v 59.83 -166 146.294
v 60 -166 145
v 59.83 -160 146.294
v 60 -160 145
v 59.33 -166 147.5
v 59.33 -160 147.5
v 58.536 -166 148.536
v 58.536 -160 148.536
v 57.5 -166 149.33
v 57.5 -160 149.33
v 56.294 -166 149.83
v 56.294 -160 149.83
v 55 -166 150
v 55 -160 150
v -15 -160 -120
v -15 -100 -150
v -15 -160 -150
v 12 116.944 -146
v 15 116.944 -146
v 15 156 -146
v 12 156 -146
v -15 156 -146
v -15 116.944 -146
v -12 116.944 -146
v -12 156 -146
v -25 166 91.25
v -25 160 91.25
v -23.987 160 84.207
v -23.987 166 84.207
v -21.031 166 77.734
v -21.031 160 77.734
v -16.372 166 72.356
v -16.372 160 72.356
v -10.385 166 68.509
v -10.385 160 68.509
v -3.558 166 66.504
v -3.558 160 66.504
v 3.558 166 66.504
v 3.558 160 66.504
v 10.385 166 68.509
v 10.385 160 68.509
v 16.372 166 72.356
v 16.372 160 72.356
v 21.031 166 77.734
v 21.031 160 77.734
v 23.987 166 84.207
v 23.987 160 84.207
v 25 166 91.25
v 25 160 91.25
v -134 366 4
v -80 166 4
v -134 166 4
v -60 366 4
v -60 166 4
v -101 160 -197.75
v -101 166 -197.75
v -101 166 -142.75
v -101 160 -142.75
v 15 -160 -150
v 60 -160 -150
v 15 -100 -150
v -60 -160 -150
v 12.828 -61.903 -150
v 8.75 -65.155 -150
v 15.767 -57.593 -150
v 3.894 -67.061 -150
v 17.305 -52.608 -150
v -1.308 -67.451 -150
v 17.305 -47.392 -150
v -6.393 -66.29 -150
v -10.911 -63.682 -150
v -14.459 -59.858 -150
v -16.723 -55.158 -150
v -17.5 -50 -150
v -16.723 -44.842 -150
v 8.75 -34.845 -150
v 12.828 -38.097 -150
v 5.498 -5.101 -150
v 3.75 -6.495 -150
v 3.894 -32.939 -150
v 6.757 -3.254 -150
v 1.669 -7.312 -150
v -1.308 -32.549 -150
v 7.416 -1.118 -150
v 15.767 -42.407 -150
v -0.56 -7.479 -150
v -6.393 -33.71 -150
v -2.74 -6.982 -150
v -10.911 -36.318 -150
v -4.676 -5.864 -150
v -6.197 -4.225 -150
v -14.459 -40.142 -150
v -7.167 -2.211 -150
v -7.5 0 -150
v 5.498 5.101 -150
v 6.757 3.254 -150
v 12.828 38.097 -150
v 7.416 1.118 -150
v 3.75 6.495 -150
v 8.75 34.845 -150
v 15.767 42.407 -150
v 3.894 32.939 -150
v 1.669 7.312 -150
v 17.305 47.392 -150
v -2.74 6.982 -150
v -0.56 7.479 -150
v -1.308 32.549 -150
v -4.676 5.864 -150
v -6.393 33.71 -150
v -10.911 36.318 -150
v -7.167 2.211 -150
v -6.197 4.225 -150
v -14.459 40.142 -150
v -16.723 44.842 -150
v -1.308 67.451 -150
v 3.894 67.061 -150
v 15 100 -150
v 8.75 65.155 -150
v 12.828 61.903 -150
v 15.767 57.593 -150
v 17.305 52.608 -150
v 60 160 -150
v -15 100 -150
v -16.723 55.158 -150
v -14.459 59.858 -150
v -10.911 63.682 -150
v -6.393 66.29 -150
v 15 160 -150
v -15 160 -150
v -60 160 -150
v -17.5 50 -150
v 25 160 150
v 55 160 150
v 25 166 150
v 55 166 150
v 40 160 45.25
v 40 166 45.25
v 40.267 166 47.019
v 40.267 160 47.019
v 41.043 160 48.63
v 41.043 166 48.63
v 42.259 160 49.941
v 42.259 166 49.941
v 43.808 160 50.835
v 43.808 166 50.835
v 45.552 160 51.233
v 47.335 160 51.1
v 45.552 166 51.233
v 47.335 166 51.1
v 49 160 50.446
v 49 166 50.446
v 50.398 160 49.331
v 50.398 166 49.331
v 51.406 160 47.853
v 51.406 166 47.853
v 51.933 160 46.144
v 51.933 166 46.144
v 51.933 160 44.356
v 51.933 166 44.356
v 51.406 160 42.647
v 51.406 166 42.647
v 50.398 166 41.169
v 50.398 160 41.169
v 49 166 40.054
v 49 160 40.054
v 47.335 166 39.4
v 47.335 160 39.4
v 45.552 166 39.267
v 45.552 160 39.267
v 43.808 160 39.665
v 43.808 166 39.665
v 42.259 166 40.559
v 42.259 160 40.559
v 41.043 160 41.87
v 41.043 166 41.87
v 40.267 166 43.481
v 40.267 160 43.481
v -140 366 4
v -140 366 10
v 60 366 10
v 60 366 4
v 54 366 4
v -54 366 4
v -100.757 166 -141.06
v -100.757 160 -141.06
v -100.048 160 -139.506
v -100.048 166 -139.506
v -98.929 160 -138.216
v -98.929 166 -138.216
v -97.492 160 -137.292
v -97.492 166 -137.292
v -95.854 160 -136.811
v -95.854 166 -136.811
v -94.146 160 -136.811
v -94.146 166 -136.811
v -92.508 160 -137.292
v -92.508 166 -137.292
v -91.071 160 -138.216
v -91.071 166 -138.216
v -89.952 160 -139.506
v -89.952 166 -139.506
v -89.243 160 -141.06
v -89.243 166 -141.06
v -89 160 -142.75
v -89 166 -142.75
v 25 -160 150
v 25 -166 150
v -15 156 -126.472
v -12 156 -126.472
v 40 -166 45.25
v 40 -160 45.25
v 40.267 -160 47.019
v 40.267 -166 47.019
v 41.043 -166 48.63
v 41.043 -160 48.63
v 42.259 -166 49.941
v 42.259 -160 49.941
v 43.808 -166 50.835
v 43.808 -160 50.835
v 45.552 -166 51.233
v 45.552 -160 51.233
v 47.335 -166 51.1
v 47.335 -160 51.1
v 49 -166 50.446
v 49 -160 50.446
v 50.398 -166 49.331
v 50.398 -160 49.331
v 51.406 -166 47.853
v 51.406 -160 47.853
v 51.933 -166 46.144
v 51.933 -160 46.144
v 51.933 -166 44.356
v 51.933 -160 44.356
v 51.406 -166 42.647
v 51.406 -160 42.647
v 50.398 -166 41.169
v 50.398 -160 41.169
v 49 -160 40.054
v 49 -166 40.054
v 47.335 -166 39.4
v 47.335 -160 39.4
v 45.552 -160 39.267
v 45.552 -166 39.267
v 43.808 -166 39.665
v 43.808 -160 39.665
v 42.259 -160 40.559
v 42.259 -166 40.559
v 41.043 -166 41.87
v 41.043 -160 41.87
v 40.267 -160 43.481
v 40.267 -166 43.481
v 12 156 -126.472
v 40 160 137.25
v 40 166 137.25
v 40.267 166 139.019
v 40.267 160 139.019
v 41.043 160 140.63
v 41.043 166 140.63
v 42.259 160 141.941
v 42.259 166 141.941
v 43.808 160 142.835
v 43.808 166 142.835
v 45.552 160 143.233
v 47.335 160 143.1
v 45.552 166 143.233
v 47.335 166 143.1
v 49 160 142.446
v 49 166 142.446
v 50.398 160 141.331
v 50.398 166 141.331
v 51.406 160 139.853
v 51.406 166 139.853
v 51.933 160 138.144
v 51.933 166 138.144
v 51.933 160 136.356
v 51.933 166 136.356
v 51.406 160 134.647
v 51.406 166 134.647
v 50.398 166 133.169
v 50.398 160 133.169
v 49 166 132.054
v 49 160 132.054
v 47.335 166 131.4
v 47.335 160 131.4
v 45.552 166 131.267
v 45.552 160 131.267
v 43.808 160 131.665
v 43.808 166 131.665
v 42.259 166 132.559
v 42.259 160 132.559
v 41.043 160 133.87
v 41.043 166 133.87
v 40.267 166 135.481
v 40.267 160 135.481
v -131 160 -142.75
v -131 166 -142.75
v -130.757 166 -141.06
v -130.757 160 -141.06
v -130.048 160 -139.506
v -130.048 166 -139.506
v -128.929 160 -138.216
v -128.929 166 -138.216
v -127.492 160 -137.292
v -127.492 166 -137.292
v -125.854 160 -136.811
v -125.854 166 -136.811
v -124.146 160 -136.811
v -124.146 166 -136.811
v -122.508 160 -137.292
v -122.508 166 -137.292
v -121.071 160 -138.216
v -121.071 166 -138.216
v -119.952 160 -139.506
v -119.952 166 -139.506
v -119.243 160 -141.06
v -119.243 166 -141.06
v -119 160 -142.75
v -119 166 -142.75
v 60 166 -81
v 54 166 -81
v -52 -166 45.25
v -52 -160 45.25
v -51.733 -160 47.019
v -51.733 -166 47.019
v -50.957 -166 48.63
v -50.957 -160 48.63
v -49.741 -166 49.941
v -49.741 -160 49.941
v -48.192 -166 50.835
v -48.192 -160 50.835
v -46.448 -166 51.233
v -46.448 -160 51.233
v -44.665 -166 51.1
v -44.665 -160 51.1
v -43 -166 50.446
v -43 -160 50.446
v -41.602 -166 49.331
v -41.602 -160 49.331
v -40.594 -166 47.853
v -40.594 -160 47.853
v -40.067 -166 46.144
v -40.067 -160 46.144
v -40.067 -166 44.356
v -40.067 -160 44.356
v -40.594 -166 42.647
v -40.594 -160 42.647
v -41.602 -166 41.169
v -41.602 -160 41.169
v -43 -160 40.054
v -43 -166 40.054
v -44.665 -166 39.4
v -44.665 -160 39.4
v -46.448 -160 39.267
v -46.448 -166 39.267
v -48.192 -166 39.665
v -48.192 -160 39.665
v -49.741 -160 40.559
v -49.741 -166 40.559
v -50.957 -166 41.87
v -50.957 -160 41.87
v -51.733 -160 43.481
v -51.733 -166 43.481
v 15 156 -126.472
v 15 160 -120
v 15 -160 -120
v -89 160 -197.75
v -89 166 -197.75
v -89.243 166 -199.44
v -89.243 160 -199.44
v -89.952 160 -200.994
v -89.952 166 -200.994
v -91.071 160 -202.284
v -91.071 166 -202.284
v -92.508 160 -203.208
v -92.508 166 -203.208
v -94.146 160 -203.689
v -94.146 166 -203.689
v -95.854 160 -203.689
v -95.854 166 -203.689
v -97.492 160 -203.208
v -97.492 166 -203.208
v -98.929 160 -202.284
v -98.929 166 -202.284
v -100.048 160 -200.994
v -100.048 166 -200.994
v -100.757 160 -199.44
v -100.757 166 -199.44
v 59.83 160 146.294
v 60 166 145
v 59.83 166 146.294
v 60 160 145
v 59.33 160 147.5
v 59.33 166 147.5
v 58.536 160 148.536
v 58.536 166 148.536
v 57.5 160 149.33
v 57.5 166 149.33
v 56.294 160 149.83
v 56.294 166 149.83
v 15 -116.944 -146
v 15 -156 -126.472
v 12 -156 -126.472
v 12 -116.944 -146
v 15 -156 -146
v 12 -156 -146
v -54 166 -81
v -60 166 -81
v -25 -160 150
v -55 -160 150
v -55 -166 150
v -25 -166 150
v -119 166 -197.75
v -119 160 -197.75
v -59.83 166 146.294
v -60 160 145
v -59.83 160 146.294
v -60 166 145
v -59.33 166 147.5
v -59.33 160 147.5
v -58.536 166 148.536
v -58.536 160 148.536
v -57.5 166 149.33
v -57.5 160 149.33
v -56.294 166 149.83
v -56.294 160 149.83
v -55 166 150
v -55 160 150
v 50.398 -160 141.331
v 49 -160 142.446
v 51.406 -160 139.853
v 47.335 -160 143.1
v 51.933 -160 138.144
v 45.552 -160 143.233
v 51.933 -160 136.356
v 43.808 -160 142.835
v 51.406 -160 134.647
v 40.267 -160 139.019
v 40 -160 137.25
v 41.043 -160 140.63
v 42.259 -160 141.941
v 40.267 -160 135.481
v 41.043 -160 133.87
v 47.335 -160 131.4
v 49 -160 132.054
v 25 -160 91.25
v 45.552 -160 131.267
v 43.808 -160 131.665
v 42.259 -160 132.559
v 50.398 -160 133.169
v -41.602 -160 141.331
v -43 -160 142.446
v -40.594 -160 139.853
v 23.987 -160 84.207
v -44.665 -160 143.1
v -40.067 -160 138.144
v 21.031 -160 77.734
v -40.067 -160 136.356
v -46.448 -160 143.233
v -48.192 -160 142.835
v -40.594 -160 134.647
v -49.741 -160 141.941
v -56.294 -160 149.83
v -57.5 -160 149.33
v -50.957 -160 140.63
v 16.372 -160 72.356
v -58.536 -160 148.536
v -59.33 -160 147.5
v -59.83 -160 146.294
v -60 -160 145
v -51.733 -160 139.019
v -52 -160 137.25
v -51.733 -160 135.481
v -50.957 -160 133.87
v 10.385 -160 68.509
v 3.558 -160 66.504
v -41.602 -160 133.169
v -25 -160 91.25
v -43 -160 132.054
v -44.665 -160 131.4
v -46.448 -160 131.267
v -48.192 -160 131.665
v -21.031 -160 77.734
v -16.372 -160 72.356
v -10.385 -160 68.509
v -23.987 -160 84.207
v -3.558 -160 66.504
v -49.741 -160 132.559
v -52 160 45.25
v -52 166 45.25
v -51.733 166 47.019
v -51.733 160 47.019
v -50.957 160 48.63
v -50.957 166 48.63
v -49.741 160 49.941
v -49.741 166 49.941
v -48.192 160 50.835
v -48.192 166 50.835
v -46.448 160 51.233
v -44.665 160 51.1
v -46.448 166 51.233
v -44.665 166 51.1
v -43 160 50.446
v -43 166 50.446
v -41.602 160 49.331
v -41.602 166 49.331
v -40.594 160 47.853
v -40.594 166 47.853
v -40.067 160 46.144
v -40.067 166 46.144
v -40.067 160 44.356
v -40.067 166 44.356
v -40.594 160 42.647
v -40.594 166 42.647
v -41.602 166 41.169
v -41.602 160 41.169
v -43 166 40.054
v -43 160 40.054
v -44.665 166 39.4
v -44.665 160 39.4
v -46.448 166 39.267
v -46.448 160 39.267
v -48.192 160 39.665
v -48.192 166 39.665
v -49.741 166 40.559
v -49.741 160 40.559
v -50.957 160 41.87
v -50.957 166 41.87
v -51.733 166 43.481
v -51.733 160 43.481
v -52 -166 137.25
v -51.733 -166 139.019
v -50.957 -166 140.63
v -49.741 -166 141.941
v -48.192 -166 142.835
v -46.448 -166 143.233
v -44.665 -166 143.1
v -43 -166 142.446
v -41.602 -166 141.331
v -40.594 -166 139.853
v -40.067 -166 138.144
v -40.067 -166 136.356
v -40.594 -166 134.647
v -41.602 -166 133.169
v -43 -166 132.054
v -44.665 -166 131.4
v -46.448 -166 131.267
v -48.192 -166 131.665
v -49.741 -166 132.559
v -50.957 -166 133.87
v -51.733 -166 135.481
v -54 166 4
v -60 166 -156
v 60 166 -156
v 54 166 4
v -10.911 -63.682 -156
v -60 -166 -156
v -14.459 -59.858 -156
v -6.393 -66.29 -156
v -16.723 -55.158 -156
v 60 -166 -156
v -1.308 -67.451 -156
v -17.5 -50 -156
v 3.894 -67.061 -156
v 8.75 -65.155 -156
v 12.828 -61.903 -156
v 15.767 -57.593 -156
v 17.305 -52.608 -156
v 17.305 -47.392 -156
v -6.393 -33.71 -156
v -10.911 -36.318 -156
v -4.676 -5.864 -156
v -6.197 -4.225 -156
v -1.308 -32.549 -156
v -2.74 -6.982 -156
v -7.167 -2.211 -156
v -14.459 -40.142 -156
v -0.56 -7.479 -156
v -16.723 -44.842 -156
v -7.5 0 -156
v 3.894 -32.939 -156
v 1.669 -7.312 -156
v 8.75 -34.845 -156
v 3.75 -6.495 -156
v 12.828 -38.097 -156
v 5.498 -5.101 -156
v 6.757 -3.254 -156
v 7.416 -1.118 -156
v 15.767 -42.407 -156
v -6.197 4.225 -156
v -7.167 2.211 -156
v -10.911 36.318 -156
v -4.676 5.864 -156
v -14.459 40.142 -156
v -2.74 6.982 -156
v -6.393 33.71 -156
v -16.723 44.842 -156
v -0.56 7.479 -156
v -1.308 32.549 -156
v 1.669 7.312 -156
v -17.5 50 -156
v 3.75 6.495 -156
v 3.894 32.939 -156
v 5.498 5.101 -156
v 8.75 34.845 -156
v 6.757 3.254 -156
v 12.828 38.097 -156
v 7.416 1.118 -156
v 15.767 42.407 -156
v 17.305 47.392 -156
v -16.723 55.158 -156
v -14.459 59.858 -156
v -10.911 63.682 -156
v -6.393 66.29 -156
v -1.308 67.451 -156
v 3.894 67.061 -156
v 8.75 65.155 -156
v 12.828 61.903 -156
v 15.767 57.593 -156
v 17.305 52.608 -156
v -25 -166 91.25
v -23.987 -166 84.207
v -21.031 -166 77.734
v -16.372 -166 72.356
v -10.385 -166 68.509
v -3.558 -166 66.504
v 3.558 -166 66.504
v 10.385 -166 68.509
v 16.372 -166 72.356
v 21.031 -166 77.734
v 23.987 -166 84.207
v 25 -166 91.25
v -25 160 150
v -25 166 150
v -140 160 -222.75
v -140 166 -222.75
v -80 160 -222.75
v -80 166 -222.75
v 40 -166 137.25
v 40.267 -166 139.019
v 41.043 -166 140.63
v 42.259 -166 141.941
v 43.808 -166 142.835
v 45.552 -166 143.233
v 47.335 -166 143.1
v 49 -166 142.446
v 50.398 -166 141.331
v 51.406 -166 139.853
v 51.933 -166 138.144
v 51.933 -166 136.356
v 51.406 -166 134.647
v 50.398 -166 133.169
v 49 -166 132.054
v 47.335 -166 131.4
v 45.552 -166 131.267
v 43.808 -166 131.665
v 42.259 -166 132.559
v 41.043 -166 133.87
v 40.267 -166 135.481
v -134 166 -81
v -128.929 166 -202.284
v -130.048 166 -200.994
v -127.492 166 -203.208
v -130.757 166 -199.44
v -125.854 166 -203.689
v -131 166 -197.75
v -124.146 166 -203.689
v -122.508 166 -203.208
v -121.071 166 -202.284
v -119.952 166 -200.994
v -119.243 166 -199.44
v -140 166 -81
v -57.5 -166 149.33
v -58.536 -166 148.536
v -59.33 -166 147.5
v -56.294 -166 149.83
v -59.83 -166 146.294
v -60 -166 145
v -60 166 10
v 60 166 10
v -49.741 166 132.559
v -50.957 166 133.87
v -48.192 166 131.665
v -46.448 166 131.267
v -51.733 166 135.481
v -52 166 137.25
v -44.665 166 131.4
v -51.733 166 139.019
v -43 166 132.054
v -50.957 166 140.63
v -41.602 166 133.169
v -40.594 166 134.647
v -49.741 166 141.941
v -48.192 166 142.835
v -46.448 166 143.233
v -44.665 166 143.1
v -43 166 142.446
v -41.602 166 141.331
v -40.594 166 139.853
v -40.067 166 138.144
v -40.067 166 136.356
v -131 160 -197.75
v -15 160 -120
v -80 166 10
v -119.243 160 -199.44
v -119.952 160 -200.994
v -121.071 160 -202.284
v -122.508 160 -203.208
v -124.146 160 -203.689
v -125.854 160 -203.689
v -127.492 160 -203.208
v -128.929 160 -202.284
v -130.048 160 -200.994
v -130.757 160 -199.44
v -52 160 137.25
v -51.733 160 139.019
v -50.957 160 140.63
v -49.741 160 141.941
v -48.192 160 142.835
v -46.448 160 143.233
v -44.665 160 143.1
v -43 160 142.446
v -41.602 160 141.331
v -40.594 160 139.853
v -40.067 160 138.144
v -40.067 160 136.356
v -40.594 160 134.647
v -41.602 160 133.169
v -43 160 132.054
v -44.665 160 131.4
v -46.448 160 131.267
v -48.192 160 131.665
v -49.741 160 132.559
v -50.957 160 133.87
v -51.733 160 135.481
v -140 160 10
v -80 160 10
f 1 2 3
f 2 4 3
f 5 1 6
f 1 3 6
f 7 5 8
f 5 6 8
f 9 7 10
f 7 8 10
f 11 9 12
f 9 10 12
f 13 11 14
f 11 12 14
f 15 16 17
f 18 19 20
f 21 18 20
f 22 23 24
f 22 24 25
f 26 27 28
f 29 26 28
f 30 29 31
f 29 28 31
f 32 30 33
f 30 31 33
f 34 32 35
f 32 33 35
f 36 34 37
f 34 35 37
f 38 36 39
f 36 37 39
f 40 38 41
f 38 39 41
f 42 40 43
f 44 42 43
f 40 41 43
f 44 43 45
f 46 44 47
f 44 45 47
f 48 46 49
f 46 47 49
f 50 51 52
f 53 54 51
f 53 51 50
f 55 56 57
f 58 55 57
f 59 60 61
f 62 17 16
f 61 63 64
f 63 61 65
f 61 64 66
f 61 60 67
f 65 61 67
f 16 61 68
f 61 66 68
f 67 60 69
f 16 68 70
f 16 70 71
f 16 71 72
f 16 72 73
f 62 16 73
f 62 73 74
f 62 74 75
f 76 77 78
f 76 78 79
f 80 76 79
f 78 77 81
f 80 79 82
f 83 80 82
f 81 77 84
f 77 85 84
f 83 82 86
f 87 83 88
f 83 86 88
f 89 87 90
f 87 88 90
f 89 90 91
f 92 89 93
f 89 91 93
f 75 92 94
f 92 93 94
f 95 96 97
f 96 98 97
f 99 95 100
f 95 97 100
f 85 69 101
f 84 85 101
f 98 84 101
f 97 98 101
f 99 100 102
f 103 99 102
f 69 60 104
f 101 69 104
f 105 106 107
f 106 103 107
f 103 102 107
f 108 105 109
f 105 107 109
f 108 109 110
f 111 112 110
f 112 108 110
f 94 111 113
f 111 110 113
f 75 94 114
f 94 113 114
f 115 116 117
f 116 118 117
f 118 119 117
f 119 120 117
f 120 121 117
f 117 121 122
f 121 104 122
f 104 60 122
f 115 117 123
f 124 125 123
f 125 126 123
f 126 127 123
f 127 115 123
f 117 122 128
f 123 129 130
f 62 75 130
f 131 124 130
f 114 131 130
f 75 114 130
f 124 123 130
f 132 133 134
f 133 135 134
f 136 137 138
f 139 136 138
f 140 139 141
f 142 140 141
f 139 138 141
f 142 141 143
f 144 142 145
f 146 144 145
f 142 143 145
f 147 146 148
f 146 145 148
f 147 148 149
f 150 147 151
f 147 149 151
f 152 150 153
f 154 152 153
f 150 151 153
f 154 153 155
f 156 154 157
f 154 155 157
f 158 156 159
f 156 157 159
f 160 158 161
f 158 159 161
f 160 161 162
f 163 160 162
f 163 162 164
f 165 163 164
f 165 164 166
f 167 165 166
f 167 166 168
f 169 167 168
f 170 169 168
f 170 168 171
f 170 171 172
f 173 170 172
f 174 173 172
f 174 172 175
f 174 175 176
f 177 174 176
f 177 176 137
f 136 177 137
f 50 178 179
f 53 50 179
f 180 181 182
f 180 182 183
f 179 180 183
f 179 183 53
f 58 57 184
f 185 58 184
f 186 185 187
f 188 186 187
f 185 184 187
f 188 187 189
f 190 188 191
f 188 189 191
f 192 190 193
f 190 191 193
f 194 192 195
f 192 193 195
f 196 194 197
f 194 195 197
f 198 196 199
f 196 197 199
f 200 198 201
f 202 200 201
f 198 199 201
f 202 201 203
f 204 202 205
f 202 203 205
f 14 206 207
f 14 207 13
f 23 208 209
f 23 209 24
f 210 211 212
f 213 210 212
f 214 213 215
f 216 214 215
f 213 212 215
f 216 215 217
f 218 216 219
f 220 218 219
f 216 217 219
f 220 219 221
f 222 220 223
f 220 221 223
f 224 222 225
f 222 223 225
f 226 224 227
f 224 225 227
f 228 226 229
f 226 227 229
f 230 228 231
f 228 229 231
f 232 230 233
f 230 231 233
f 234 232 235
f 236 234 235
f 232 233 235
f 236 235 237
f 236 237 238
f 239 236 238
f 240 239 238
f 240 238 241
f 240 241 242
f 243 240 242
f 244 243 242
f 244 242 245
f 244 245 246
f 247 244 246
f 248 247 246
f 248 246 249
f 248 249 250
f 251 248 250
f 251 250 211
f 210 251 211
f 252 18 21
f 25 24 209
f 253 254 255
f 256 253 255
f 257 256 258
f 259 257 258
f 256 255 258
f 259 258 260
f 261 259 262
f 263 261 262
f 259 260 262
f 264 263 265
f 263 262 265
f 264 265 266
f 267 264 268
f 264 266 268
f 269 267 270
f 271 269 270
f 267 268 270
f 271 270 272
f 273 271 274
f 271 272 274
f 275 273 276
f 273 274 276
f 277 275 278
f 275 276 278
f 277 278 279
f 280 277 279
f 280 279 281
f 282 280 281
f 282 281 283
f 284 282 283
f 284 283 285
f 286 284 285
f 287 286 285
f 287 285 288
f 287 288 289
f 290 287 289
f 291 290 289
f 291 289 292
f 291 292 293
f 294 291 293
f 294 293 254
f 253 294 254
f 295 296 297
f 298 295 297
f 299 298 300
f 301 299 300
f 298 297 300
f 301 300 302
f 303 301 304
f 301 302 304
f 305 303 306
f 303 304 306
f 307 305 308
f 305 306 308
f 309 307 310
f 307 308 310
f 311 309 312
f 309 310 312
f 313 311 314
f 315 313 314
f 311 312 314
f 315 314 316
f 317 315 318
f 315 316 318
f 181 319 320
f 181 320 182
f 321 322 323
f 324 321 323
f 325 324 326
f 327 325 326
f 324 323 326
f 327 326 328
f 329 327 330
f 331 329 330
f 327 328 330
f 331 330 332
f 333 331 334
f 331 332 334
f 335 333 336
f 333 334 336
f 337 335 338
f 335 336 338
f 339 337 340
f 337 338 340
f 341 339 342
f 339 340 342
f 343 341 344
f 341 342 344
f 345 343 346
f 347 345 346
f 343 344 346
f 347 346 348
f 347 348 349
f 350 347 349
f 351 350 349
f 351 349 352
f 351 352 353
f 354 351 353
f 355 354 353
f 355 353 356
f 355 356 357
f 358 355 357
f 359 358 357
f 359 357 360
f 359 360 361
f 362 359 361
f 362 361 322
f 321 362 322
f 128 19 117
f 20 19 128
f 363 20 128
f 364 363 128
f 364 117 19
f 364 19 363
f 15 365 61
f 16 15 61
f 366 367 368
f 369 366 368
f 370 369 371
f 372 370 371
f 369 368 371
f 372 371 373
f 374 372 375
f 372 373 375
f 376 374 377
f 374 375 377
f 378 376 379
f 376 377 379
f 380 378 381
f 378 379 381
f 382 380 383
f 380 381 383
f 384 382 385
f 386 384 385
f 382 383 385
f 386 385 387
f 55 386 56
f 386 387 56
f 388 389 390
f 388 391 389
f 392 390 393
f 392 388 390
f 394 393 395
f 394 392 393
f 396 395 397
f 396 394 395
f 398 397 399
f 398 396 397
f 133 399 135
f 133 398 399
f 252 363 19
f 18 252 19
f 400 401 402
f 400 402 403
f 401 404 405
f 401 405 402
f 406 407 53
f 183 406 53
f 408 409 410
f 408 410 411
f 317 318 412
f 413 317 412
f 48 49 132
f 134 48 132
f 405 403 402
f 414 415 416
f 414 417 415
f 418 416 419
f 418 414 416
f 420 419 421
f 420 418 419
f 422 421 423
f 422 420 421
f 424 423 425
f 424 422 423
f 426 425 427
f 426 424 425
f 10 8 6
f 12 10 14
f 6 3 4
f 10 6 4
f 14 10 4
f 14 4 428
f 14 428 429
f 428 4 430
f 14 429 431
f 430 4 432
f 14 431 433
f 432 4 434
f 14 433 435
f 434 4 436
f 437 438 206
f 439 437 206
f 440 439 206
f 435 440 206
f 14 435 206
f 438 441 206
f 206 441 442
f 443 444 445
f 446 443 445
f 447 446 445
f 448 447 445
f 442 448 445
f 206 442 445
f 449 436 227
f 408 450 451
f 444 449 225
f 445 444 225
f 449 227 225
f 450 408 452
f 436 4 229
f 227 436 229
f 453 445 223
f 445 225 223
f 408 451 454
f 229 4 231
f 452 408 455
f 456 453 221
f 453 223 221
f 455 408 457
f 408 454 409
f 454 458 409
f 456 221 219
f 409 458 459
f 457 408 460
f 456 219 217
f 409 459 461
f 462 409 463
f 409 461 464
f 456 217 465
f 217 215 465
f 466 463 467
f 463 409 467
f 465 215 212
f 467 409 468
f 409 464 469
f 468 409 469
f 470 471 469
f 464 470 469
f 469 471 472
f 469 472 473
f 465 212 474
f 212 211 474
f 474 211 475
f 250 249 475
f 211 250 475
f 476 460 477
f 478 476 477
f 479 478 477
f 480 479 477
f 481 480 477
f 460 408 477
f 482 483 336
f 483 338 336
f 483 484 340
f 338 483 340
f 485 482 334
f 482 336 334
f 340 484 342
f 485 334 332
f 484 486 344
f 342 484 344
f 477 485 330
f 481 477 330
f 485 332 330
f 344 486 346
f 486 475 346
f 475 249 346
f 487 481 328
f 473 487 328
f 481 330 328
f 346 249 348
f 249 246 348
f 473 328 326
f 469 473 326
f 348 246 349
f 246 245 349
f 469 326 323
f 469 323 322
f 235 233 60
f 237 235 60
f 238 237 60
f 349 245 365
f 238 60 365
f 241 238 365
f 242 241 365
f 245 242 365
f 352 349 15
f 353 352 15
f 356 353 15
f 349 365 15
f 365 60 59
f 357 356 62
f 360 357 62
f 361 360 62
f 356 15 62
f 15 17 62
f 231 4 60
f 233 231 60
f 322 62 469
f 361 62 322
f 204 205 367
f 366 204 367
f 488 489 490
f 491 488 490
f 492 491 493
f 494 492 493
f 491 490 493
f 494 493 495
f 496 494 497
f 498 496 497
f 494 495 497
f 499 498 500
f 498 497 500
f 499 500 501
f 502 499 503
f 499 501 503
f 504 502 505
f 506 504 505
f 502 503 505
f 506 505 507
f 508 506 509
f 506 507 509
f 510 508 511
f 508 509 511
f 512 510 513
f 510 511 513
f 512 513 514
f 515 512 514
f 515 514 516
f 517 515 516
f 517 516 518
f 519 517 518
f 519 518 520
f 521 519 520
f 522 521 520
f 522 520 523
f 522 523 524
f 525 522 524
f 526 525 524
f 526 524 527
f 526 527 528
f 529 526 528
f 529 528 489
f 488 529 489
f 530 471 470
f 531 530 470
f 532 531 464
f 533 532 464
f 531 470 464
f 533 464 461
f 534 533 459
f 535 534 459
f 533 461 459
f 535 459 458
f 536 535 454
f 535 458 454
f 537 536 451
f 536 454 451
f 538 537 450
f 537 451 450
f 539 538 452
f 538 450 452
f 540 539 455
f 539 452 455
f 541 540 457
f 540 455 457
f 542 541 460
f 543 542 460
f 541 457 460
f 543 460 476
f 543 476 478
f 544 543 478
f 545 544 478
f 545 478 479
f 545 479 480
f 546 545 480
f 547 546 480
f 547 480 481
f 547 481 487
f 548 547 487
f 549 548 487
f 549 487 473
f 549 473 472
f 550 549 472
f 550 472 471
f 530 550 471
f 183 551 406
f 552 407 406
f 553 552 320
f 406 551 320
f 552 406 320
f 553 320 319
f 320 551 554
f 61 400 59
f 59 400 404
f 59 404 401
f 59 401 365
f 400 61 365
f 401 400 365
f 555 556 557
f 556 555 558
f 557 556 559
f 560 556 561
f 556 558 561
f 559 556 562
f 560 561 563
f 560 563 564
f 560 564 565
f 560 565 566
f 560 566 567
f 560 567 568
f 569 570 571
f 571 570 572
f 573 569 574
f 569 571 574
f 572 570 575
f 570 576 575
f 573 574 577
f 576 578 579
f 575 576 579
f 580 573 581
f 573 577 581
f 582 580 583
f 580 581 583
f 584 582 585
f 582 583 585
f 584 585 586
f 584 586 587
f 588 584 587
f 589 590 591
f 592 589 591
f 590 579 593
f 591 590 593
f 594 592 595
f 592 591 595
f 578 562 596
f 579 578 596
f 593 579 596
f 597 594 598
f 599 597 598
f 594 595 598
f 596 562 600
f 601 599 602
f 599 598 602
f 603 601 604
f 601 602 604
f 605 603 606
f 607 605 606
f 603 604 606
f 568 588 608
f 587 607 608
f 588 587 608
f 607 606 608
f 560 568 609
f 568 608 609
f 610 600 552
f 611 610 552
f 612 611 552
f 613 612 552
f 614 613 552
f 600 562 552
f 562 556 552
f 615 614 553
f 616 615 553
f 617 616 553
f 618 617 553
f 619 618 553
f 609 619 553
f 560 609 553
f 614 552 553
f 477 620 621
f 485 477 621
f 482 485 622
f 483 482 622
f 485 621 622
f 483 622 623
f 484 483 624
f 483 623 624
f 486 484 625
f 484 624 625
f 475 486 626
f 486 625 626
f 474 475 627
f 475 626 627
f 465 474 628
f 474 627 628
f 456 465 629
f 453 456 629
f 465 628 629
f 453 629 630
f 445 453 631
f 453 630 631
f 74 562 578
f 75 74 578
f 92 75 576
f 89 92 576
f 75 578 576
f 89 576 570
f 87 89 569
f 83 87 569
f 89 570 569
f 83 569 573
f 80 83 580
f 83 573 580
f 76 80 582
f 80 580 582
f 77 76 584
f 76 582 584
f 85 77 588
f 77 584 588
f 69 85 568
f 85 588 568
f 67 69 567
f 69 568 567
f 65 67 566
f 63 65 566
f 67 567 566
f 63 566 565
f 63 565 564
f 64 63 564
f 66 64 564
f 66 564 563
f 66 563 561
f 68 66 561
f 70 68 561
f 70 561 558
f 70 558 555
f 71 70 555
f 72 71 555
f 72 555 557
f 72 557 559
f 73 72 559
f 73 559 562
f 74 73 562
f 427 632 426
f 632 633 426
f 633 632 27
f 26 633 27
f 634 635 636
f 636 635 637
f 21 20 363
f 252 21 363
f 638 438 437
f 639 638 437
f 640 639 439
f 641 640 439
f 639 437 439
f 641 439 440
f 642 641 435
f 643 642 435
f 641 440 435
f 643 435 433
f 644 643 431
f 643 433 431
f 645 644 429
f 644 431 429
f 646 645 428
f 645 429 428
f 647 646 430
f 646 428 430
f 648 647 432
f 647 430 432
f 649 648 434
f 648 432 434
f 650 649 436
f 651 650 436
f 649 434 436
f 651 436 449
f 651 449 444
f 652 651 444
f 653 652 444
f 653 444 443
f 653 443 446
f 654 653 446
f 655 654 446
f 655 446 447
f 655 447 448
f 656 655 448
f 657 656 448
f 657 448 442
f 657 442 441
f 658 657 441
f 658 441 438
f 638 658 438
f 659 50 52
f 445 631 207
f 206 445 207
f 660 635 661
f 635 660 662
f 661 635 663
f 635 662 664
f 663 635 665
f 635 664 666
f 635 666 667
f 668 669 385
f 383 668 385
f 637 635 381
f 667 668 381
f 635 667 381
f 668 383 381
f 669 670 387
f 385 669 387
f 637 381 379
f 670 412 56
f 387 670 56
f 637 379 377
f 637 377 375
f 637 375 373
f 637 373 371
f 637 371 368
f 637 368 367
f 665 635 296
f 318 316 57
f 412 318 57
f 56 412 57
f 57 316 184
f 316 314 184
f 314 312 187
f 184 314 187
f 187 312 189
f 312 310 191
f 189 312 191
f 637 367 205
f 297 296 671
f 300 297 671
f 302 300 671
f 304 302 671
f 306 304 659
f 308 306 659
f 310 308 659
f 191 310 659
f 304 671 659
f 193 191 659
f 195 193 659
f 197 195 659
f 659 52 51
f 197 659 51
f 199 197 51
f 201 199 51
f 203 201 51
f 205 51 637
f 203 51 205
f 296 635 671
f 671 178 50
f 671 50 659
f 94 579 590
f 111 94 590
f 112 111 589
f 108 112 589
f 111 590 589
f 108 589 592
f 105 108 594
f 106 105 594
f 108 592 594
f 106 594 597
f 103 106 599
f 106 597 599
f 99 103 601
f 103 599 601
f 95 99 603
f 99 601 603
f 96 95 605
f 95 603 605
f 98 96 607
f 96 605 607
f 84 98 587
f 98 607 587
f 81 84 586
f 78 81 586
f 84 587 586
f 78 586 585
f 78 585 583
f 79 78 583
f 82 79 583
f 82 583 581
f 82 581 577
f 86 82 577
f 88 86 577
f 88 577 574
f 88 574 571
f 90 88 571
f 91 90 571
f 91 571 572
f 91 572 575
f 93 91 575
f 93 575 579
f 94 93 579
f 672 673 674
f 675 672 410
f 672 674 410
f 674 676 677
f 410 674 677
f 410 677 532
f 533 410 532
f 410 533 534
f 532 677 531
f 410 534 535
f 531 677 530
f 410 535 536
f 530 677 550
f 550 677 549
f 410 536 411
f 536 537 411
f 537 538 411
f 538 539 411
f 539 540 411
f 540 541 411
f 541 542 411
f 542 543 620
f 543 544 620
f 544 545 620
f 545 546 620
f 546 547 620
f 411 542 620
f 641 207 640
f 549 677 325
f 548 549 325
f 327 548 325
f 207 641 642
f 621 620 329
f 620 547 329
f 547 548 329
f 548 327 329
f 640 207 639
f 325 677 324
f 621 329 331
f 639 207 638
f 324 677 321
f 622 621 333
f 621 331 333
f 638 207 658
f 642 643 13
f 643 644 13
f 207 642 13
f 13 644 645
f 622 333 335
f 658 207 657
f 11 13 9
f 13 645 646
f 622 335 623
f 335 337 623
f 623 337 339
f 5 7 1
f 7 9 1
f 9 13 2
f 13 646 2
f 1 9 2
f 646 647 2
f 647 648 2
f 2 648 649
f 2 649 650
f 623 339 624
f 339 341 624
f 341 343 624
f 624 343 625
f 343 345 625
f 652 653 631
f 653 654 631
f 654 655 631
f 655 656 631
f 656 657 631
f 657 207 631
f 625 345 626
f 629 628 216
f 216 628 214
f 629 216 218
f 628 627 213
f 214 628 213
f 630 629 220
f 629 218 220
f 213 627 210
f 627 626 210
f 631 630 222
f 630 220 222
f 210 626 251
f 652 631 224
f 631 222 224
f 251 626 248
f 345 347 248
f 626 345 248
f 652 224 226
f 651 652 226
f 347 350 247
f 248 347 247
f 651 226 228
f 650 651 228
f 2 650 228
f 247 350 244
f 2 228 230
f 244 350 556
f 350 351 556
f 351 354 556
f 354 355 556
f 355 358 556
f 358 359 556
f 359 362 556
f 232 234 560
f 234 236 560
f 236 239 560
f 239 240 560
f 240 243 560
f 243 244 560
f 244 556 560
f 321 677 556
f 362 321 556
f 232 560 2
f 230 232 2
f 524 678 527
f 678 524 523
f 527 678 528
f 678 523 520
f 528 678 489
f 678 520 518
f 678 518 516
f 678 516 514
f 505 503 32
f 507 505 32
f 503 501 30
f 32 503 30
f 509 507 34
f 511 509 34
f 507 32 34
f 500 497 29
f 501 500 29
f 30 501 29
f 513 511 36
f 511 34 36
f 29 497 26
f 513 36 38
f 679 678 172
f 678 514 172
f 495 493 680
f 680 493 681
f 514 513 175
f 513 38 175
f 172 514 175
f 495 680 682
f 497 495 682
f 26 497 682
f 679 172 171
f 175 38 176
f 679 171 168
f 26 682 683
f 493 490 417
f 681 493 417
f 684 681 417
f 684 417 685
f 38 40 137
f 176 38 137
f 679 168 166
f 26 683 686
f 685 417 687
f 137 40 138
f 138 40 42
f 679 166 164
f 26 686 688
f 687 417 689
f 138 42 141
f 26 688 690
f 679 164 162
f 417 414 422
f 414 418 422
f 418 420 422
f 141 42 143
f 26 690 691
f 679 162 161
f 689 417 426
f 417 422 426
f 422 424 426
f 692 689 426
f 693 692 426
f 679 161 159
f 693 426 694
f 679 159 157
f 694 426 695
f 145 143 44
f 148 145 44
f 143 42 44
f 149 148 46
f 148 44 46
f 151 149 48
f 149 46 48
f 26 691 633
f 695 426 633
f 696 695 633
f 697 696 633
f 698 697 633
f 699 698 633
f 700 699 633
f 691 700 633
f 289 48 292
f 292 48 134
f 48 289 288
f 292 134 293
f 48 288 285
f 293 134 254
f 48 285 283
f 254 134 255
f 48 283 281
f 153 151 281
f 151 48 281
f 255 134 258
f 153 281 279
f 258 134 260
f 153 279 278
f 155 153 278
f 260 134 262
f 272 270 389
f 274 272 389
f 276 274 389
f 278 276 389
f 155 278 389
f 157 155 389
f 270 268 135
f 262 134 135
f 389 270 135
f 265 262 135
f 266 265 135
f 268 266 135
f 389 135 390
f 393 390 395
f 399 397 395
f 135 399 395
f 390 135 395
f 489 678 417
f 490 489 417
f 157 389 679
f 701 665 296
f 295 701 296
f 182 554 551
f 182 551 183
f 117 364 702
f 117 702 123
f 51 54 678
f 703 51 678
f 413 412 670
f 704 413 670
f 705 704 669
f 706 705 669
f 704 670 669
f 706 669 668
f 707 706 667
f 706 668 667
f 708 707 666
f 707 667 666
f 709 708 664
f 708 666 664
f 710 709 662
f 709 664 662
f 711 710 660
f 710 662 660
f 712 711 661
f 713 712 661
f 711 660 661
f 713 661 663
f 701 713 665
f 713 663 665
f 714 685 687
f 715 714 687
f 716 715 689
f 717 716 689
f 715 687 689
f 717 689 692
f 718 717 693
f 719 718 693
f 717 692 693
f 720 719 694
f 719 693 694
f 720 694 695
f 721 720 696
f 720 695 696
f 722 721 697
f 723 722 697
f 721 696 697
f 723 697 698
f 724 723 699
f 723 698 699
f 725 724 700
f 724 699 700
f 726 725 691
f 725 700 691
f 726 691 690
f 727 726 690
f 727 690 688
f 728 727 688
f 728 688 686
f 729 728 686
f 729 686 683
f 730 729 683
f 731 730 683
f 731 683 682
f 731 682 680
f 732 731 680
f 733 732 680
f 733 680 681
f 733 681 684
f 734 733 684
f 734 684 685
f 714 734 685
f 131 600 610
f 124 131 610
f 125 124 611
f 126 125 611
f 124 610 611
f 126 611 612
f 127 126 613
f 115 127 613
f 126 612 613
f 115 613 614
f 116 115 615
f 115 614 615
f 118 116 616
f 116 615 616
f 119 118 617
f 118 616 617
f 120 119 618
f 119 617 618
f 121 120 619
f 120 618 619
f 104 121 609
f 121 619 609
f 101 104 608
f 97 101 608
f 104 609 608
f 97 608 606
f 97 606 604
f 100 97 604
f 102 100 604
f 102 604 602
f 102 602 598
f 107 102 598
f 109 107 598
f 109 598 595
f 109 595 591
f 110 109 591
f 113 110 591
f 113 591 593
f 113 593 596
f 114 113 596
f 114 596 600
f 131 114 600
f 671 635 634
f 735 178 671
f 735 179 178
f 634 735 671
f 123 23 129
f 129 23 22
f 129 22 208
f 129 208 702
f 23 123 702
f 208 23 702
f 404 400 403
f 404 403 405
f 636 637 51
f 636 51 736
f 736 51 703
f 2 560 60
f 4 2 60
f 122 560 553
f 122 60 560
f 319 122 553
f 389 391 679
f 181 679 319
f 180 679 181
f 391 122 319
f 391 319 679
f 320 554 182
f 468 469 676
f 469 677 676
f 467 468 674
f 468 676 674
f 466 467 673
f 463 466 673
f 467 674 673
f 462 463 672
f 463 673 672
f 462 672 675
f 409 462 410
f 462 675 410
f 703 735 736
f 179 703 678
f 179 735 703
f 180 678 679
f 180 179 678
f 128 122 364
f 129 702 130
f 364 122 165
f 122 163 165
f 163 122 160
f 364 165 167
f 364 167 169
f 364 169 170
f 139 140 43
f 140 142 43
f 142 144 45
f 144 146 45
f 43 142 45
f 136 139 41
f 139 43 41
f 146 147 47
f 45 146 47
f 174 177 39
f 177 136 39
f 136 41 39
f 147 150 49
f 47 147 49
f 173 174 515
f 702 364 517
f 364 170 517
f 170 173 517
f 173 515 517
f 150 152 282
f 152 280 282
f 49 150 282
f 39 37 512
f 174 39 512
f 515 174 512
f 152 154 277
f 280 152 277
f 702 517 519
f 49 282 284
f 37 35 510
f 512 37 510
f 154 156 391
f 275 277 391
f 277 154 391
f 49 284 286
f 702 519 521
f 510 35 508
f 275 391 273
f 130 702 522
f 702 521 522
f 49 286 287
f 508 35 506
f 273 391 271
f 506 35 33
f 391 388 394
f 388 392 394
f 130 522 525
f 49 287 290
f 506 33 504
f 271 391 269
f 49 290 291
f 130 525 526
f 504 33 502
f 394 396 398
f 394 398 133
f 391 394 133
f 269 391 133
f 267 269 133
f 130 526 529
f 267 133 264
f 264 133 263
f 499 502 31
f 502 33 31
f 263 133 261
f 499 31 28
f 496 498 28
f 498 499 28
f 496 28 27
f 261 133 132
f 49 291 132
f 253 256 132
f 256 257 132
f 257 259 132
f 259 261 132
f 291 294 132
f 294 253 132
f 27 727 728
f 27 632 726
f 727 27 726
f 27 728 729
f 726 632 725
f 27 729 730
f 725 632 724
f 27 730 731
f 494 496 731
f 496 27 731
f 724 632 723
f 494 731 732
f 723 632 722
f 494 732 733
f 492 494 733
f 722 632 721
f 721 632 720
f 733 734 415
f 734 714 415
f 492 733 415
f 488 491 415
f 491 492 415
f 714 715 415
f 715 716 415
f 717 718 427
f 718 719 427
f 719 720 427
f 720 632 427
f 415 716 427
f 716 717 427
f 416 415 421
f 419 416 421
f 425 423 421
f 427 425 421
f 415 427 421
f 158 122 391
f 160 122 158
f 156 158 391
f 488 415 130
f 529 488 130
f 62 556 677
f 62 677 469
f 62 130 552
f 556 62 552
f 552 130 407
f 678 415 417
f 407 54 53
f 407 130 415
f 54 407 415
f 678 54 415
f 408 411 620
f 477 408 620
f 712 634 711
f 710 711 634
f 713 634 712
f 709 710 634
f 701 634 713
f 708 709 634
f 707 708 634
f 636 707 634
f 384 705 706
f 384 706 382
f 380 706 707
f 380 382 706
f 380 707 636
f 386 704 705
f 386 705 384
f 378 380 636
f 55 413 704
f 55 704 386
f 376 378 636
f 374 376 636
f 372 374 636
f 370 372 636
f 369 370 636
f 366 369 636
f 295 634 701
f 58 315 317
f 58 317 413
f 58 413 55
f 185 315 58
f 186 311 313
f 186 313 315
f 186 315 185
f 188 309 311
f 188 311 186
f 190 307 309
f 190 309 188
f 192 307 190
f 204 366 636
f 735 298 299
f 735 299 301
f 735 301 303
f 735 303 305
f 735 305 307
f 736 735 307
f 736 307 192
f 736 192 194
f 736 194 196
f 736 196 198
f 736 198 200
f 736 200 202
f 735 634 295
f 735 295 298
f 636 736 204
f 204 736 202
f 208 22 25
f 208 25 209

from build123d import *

# Parameters (mm, degrees)
F2_W      = 120
F2_H      = 6
F5_D      = 12
F7_DEPTH  = 332
F9_DEPTH  = 15
F11_DEPTH = 3
F12_R     = 5
F14_D     = 35
F15_D     = 15
F16_W     = 200
F16_H     = 6
F17_DEPTH = 200
F18_DEPTH = 6
F19_W     = 60
F19_H     = 6
F19_H_2   = 226.75
F20_DEPTH = 6
F22_DEPTH = 6


# Not quite as in the source:
# - a pattern or mirror of a feature is missing from the dataset's text; its kind, count and spacing are read off the source's solid


with BuildPart() as f3:
    # F3: sweep along a path in F0
    with BuildLine(Plane.YZ) as f3_path:
        Line((-160, 150), (-160, -150))
        Line((-160, -150), (160, -150))
        Line((160, -150), (160, 150))
    # F2 (on offset) → F3 (sweep)
    with BuildSketch(Plane.XY.offset(150)):
        with Locations((0, -163)):
            Rectangle(F2_W, F2_H)
    sweep(path=f3_path.line, transition=Transition.RIGHT)

    # F5 (through all)
    with Locations(Plane.XZ.offset(166)):
        with Locations((-46, 137.25), (-46, 45.25), (46, 45.25), (46, 137.25)):
            Hole(F5_D / 2)

    # F6 (on face) → F7 (cut, through all)
    with BuildSketch(Plane.XZ.offset(166)):
        with BuildLine():
            Line((25, 150), (-25, 150))
            Line((-25, 150), (-25, 91.25))
            ThreePointArc((-25, 91.25), (0, 66.25), (25, 91.25))
            Line((25, 91.25), (25, 150))
        make_face()
    extrude(amount=-F7_DEPTH, mode=Mode.SUBTRACT)

    # F8 (on Right) → F9 (join, symmetric)
    with BuildSketch(Plane.YZ):
        Polygon((160, -150), (160, -120), (100, -150), align=None)
    f9 = extrude(amount=F9_DEPTH, both=True)

    # F9_copies: F9 across plane
    add(f9.mirror(Plane(origin=(0, 0, 0), x_dir=(0, 0, -1), z_dir=(0, -1, 0))))

    # F10 (on face) → F11 (cut)
    with BuildSketch(Plane.YZ.offset(15)):
        Polygon((116.94427191, -146), (156, -146), (156, -126.472135955), align=None)
    f11 = extrude(amount=-F11_DEPTH, mode=Mode.SUBTRACT)

    # F11_copies: F11 across plane
    add(f11.mirror(Plane(origin=(0, 0, 0), x_dir=(0, 0, -1), z_dir=(-1, 0, 0))), mode=Mode.SUBTRACT)

    # F11_copies1: F11 across plane
    add(f11.mirror(Plane(origin=(0, 0, 0), x_dir=(0, 0, -1), z_dir=(0, -1, 0))), mode=Mode.SUBTRACT)

    # F12
    f12_edges = [f3.edges().sort_by_distance(p)[0] for p in [
        (60, -163, 150),
        (-60, -163, 150),
        (-60, 163, 150),
        (60, 163, 150),
    ]]
    fillet(f12_edges, radius=F12_R)

    # F14 (through all)
    with Locations(Plane.XY.offset(-150)):
        with Locations((0, 50), (0, -50)):
            Hole(F14_D / 2)

    # F15 (through all)
    with Locations(Plane.XY.offset(-150)):
        with Locations((0, 0)):
            Hole(F15_D / 2)

    # F16 (on face) → F17 (join)
    with BuildSketch(Plane.YZ.offset(60)):
        with Locations((266, 7)):
            Rectangle(F16_W, F16_H)
    extrude(amount=-F17_DEPTH)

    # F16 (on face) → F18 (join)
    with BuildSketch(Plane.YZ.offset(60)):
        Polygon((366, 4), (166, 4), (166, -81), align=None)
    f18 = extrude(amount=-F18_DEPTH)

    # F18_copies: F18 across plane
    add(f18.mirror(Plane(origin=(0, 0, 0), x_dir=(0, 0, -1), z_dir=(-1, 0, 0))))

    # F19 (on face) → F20 (join)
    with BuildSketch(Plane.XZ.offset(-166)):
        with Locations((-110, 7)):
            Rectangle(F19_W, F19_H)
        with Locations((-110, -109.375)):
            Rectangle(F19_W, F19_H_2)
        with BuildLine():
            ThreePointArc((-131, -142.75), (-125, -136.75), (-119, -142.75))
            Line((-119, -142.75), (-119, -197.75))
            ThreePointArc((-119, -197.75), (-125, -203.75), (-131, -197.75))
            Line((-131, -197.75), (-131, -142.75))
        make_face(mode=Mode.SUBTRACT)
        with BuildLine():
            Line((-101, -197.75), (-101, -142.75))
            ThreePointArc((-101, -142.75), (-95, -136.75), (-89, -142.75))
            Line((-89, -142.75), (-89, -197.75))
            ThreePointArc((-89, -197.75), (-95, -203.75), (-101, -197.75))
        make_face(mode=Mode.SUBTRACT)
    extrude(amount=F20_DEPTH)

    # F21 (on face) → F22 (join)
    with BuildSketch(Plane(origin=(-140, 0, 0), x_dir=(0, -1, 0), z_dir=(-1, 0, 0))):
        Polygon((-166, -81), (-166, 4), (-366, 4), align=None)
    extrude(amount=-F22_DEPTH)


solid = f3.part
